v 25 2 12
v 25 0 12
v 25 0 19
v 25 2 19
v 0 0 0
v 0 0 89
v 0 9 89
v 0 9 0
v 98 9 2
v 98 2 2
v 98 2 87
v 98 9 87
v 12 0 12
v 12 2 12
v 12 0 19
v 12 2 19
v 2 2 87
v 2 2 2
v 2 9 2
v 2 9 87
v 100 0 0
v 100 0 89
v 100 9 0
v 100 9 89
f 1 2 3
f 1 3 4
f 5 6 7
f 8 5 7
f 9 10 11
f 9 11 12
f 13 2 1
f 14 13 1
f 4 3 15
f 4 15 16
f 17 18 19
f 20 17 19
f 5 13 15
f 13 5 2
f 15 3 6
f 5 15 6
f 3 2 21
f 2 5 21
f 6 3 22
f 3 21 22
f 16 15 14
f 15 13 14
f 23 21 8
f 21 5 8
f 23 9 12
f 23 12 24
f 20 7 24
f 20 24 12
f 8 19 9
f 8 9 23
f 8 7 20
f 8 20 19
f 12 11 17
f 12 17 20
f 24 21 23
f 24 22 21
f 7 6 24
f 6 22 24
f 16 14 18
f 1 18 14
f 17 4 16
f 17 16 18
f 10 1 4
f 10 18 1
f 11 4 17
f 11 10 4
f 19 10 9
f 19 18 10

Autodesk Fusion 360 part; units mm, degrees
box "BoxPrimitive1" add length 89 width 100 height 2 placed x (0, 0, 1) y (1, 0, 0) z (0, 1, 0) at (0, 0, 0)
box "BoxPrimitive2" add length 89 width 2 height 7 placed x (0, 0, 1) y (1, 0, 0) z (0, 1, 0) at (0, 2, 0)
box "BoxPrimitive3" add length 89 width 2 height 7 placed x (0, 0, 1) y (1, 0, 0) z (0, 1, 0) at (98, 2, 0)
box "BoxPrimitive4" add length 2 width 96 height 7 placed x (0, 0, 1) y (1, 0, 0) z (0, 1, 0) at (2, 2, 0)
box "BoxPrimitive5" add length 2 width 96 height 7 placed x (0, 0, -1) y (-1, 0, 0) z (0, 1, 0) at (98, 2, 89)
box "BoxPrimitive6" cut length 7 width 13 height -2 placed x (0, 0, -1) y (-1, 0, 0) z (0, 1, 0) at (25, 2, 19)
